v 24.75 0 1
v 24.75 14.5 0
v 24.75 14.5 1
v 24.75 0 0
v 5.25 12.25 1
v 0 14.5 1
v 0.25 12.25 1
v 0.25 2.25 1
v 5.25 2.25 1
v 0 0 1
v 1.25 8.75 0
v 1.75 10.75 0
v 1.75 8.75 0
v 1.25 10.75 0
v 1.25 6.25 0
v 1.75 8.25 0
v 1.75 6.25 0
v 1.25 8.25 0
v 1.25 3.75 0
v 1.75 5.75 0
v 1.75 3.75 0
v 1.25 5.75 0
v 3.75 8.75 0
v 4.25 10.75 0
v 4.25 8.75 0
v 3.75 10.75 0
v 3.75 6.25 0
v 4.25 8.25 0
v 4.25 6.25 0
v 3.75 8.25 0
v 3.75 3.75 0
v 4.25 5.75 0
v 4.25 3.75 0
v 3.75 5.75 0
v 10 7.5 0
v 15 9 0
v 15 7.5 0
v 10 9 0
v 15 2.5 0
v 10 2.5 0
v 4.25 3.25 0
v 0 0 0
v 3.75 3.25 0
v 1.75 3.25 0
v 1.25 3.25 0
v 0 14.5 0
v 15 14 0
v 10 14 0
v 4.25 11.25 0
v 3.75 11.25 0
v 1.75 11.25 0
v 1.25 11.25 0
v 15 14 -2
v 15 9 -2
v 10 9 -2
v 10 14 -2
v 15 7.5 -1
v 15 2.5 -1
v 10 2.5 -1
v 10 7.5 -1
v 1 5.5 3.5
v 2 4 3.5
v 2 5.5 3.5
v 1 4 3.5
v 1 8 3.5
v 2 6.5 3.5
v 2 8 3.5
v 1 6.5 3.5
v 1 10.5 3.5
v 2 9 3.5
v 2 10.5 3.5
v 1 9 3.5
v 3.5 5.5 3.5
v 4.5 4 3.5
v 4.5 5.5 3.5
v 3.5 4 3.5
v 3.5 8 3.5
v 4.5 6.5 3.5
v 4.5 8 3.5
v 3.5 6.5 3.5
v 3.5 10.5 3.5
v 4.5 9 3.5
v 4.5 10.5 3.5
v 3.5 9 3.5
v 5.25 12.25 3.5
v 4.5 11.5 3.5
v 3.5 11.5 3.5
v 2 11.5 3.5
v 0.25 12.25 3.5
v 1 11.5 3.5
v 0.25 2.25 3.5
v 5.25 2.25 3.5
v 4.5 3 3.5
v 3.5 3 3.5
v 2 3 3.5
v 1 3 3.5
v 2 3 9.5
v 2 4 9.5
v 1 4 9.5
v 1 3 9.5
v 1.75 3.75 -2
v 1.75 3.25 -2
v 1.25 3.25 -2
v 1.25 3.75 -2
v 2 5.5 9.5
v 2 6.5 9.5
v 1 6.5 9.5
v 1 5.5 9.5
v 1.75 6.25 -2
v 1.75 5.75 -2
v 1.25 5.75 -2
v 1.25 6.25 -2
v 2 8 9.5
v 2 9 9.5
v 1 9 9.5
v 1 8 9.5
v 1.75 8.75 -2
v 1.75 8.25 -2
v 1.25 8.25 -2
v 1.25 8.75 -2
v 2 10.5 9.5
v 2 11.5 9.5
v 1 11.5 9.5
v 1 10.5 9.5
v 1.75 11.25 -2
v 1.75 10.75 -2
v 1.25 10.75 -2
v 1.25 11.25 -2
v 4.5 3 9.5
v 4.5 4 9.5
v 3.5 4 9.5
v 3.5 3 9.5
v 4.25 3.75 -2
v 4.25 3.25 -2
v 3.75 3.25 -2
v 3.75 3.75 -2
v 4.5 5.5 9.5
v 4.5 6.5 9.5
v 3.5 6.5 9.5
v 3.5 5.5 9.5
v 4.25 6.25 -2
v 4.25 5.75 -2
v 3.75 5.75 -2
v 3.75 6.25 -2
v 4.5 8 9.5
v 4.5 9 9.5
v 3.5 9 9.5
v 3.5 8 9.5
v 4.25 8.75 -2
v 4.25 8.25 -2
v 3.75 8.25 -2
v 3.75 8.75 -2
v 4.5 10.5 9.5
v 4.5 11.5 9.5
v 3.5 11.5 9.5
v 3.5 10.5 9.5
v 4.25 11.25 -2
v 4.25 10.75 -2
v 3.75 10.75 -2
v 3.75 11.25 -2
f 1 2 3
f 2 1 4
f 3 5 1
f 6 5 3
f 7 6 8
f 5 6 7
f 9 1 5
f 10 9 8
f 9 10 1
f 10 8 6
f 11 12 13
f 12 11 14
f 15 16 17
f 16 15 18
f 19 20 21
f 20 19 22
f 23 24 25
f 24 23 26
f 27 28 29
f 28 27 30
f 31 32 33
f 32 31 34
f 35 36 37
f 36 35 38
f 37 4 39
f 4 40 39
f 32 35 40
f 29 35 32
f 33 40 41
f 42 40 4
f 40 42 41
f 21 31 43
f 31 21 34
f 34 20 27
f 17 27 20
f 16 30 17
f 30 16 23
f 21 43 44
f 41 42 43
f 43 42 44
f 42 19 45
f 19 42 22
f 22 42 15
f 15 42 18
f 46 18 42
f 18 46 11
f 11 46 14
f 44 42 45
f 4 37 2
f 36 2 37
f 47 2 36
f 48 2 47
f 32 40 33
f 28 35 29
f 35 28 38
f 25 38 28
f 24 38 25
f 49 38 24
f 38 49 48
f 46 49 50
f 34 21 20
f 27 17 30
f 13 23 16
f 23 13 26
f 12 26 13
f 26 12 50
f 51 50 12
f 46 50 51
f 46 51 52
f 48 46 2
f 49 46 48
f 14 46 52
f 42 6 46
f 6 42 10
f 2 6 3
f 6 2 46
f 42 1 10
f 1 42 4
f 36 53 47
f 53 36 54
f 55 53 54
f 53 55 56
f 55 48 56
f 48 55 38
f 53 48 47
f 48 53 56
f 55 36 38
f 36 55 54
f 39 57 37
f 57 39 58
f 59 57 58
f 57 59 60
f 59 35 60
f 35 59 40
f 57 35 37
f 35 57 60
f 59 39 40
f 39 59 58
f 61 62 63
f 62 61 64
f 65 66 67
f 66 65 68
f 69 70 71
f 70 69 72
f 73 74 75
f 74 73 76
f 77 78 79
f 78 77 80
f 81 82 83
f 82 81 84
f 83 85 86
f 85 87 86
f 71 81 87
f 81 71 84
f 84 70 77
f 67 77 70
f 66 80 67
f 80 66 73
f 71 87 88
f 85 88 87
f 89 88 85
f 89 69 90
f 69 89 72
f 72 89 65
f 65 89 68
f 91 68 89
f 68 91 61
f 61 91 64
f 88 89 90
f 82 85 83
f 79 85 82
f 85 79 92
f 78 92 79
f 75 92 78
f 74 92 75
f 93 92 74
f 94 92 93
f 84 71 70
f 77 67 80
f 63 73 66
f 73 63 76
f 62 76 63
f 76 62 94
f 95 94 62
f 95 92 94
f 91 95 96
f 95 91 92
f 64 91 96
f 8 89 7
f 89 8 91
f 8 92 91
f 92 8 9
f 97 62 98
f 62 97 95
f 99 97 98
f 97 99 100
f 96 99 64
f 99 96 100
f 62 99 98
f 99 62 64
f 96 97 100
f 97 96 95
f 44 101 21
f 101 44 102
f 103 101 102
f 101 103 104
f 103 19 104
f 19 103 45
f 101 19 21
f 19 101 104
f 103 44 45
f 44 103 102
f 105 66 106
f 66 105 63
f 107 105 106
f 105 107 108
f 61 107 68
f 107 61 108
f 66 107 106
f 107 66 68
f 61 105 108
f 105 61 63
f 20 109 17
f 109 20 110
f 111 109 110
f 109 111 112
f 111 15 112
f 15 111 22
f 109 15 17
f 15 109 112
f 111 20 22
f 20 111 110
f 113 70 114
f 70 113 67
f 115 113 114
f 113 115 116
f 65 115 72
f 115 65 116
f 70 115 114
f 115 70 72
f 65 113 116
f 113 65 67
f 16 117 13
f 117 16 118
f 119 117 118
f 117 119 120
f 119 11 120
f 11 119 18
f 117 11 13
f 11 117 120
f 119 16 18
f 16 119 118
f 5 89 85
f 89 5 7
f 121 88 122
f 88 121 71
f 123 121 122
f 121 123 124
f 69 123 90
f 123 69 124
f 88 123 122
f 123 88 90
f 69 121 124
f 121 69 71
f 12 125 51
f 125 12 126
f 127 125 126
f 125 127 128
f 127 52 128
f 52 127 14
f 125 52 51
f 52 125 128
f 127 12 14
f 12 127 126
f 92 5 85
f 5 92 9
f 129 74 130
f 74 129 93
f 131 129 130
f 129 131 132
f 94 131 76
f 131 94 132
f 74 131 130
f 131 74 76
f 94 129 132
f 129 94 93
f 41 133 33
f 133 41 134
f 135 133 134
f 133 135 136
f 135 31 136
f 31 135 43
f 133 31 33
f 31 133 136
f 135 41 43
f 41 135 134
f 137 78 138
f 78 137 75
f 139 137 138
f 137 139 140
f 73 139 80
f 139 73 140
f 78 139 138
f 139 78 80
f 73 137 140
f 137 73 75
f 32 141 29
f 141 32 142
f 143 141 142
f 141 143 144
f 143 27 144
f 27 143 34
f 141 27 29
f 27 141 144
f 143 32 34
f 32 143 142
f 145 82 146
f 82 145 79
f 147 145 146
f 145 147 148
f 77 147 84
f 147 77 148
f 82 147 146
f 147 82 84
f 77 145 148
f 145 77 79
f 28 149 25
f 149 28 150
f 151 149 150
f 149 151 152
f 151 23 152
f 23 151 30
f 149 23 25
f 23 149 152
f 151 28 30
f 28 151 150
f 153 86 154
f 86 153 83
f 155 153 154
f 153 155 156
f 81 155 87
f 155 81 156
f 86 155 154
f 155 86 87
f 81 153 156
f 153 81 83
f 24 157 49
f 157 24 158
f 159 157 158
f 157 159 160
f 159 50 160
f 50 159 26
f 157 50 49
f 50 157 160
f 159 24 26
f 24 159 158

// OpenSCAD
module esp_01s () {
    
    union() {
        color("#222222")
        cube([24.75, 14.5, 1]);

        color("black")
        translate([10,9,-2])
        cube([5,5,2]);

        color("black")
        translate([10,2.5,-1])
        cube([5,5,1]);
    }

    // pins
    translate([.25,14.5/2-10/2,1])
    pins(2,4);

}

module pins (x, y) {
    for (ix=[0:x-1]) {
    for (iy=[0:y-1]) {
        translate([ix*2.5,iy*2.5,0])
        pin();
    }
    }
}

module pin() {
    color("black")
    cube([2.5,2.5,2.5]);

    p1=2.5/2-1/2;
    color("yellow")
    translate([p1, p1, 2.5])
    cube([1,1,6]);

    p2=2.5/2-.5/2;
    color("#AAAAAA")
    translate([p2, p2, -3])
    cube([.5,.5,3]);
}

esp_01s();
